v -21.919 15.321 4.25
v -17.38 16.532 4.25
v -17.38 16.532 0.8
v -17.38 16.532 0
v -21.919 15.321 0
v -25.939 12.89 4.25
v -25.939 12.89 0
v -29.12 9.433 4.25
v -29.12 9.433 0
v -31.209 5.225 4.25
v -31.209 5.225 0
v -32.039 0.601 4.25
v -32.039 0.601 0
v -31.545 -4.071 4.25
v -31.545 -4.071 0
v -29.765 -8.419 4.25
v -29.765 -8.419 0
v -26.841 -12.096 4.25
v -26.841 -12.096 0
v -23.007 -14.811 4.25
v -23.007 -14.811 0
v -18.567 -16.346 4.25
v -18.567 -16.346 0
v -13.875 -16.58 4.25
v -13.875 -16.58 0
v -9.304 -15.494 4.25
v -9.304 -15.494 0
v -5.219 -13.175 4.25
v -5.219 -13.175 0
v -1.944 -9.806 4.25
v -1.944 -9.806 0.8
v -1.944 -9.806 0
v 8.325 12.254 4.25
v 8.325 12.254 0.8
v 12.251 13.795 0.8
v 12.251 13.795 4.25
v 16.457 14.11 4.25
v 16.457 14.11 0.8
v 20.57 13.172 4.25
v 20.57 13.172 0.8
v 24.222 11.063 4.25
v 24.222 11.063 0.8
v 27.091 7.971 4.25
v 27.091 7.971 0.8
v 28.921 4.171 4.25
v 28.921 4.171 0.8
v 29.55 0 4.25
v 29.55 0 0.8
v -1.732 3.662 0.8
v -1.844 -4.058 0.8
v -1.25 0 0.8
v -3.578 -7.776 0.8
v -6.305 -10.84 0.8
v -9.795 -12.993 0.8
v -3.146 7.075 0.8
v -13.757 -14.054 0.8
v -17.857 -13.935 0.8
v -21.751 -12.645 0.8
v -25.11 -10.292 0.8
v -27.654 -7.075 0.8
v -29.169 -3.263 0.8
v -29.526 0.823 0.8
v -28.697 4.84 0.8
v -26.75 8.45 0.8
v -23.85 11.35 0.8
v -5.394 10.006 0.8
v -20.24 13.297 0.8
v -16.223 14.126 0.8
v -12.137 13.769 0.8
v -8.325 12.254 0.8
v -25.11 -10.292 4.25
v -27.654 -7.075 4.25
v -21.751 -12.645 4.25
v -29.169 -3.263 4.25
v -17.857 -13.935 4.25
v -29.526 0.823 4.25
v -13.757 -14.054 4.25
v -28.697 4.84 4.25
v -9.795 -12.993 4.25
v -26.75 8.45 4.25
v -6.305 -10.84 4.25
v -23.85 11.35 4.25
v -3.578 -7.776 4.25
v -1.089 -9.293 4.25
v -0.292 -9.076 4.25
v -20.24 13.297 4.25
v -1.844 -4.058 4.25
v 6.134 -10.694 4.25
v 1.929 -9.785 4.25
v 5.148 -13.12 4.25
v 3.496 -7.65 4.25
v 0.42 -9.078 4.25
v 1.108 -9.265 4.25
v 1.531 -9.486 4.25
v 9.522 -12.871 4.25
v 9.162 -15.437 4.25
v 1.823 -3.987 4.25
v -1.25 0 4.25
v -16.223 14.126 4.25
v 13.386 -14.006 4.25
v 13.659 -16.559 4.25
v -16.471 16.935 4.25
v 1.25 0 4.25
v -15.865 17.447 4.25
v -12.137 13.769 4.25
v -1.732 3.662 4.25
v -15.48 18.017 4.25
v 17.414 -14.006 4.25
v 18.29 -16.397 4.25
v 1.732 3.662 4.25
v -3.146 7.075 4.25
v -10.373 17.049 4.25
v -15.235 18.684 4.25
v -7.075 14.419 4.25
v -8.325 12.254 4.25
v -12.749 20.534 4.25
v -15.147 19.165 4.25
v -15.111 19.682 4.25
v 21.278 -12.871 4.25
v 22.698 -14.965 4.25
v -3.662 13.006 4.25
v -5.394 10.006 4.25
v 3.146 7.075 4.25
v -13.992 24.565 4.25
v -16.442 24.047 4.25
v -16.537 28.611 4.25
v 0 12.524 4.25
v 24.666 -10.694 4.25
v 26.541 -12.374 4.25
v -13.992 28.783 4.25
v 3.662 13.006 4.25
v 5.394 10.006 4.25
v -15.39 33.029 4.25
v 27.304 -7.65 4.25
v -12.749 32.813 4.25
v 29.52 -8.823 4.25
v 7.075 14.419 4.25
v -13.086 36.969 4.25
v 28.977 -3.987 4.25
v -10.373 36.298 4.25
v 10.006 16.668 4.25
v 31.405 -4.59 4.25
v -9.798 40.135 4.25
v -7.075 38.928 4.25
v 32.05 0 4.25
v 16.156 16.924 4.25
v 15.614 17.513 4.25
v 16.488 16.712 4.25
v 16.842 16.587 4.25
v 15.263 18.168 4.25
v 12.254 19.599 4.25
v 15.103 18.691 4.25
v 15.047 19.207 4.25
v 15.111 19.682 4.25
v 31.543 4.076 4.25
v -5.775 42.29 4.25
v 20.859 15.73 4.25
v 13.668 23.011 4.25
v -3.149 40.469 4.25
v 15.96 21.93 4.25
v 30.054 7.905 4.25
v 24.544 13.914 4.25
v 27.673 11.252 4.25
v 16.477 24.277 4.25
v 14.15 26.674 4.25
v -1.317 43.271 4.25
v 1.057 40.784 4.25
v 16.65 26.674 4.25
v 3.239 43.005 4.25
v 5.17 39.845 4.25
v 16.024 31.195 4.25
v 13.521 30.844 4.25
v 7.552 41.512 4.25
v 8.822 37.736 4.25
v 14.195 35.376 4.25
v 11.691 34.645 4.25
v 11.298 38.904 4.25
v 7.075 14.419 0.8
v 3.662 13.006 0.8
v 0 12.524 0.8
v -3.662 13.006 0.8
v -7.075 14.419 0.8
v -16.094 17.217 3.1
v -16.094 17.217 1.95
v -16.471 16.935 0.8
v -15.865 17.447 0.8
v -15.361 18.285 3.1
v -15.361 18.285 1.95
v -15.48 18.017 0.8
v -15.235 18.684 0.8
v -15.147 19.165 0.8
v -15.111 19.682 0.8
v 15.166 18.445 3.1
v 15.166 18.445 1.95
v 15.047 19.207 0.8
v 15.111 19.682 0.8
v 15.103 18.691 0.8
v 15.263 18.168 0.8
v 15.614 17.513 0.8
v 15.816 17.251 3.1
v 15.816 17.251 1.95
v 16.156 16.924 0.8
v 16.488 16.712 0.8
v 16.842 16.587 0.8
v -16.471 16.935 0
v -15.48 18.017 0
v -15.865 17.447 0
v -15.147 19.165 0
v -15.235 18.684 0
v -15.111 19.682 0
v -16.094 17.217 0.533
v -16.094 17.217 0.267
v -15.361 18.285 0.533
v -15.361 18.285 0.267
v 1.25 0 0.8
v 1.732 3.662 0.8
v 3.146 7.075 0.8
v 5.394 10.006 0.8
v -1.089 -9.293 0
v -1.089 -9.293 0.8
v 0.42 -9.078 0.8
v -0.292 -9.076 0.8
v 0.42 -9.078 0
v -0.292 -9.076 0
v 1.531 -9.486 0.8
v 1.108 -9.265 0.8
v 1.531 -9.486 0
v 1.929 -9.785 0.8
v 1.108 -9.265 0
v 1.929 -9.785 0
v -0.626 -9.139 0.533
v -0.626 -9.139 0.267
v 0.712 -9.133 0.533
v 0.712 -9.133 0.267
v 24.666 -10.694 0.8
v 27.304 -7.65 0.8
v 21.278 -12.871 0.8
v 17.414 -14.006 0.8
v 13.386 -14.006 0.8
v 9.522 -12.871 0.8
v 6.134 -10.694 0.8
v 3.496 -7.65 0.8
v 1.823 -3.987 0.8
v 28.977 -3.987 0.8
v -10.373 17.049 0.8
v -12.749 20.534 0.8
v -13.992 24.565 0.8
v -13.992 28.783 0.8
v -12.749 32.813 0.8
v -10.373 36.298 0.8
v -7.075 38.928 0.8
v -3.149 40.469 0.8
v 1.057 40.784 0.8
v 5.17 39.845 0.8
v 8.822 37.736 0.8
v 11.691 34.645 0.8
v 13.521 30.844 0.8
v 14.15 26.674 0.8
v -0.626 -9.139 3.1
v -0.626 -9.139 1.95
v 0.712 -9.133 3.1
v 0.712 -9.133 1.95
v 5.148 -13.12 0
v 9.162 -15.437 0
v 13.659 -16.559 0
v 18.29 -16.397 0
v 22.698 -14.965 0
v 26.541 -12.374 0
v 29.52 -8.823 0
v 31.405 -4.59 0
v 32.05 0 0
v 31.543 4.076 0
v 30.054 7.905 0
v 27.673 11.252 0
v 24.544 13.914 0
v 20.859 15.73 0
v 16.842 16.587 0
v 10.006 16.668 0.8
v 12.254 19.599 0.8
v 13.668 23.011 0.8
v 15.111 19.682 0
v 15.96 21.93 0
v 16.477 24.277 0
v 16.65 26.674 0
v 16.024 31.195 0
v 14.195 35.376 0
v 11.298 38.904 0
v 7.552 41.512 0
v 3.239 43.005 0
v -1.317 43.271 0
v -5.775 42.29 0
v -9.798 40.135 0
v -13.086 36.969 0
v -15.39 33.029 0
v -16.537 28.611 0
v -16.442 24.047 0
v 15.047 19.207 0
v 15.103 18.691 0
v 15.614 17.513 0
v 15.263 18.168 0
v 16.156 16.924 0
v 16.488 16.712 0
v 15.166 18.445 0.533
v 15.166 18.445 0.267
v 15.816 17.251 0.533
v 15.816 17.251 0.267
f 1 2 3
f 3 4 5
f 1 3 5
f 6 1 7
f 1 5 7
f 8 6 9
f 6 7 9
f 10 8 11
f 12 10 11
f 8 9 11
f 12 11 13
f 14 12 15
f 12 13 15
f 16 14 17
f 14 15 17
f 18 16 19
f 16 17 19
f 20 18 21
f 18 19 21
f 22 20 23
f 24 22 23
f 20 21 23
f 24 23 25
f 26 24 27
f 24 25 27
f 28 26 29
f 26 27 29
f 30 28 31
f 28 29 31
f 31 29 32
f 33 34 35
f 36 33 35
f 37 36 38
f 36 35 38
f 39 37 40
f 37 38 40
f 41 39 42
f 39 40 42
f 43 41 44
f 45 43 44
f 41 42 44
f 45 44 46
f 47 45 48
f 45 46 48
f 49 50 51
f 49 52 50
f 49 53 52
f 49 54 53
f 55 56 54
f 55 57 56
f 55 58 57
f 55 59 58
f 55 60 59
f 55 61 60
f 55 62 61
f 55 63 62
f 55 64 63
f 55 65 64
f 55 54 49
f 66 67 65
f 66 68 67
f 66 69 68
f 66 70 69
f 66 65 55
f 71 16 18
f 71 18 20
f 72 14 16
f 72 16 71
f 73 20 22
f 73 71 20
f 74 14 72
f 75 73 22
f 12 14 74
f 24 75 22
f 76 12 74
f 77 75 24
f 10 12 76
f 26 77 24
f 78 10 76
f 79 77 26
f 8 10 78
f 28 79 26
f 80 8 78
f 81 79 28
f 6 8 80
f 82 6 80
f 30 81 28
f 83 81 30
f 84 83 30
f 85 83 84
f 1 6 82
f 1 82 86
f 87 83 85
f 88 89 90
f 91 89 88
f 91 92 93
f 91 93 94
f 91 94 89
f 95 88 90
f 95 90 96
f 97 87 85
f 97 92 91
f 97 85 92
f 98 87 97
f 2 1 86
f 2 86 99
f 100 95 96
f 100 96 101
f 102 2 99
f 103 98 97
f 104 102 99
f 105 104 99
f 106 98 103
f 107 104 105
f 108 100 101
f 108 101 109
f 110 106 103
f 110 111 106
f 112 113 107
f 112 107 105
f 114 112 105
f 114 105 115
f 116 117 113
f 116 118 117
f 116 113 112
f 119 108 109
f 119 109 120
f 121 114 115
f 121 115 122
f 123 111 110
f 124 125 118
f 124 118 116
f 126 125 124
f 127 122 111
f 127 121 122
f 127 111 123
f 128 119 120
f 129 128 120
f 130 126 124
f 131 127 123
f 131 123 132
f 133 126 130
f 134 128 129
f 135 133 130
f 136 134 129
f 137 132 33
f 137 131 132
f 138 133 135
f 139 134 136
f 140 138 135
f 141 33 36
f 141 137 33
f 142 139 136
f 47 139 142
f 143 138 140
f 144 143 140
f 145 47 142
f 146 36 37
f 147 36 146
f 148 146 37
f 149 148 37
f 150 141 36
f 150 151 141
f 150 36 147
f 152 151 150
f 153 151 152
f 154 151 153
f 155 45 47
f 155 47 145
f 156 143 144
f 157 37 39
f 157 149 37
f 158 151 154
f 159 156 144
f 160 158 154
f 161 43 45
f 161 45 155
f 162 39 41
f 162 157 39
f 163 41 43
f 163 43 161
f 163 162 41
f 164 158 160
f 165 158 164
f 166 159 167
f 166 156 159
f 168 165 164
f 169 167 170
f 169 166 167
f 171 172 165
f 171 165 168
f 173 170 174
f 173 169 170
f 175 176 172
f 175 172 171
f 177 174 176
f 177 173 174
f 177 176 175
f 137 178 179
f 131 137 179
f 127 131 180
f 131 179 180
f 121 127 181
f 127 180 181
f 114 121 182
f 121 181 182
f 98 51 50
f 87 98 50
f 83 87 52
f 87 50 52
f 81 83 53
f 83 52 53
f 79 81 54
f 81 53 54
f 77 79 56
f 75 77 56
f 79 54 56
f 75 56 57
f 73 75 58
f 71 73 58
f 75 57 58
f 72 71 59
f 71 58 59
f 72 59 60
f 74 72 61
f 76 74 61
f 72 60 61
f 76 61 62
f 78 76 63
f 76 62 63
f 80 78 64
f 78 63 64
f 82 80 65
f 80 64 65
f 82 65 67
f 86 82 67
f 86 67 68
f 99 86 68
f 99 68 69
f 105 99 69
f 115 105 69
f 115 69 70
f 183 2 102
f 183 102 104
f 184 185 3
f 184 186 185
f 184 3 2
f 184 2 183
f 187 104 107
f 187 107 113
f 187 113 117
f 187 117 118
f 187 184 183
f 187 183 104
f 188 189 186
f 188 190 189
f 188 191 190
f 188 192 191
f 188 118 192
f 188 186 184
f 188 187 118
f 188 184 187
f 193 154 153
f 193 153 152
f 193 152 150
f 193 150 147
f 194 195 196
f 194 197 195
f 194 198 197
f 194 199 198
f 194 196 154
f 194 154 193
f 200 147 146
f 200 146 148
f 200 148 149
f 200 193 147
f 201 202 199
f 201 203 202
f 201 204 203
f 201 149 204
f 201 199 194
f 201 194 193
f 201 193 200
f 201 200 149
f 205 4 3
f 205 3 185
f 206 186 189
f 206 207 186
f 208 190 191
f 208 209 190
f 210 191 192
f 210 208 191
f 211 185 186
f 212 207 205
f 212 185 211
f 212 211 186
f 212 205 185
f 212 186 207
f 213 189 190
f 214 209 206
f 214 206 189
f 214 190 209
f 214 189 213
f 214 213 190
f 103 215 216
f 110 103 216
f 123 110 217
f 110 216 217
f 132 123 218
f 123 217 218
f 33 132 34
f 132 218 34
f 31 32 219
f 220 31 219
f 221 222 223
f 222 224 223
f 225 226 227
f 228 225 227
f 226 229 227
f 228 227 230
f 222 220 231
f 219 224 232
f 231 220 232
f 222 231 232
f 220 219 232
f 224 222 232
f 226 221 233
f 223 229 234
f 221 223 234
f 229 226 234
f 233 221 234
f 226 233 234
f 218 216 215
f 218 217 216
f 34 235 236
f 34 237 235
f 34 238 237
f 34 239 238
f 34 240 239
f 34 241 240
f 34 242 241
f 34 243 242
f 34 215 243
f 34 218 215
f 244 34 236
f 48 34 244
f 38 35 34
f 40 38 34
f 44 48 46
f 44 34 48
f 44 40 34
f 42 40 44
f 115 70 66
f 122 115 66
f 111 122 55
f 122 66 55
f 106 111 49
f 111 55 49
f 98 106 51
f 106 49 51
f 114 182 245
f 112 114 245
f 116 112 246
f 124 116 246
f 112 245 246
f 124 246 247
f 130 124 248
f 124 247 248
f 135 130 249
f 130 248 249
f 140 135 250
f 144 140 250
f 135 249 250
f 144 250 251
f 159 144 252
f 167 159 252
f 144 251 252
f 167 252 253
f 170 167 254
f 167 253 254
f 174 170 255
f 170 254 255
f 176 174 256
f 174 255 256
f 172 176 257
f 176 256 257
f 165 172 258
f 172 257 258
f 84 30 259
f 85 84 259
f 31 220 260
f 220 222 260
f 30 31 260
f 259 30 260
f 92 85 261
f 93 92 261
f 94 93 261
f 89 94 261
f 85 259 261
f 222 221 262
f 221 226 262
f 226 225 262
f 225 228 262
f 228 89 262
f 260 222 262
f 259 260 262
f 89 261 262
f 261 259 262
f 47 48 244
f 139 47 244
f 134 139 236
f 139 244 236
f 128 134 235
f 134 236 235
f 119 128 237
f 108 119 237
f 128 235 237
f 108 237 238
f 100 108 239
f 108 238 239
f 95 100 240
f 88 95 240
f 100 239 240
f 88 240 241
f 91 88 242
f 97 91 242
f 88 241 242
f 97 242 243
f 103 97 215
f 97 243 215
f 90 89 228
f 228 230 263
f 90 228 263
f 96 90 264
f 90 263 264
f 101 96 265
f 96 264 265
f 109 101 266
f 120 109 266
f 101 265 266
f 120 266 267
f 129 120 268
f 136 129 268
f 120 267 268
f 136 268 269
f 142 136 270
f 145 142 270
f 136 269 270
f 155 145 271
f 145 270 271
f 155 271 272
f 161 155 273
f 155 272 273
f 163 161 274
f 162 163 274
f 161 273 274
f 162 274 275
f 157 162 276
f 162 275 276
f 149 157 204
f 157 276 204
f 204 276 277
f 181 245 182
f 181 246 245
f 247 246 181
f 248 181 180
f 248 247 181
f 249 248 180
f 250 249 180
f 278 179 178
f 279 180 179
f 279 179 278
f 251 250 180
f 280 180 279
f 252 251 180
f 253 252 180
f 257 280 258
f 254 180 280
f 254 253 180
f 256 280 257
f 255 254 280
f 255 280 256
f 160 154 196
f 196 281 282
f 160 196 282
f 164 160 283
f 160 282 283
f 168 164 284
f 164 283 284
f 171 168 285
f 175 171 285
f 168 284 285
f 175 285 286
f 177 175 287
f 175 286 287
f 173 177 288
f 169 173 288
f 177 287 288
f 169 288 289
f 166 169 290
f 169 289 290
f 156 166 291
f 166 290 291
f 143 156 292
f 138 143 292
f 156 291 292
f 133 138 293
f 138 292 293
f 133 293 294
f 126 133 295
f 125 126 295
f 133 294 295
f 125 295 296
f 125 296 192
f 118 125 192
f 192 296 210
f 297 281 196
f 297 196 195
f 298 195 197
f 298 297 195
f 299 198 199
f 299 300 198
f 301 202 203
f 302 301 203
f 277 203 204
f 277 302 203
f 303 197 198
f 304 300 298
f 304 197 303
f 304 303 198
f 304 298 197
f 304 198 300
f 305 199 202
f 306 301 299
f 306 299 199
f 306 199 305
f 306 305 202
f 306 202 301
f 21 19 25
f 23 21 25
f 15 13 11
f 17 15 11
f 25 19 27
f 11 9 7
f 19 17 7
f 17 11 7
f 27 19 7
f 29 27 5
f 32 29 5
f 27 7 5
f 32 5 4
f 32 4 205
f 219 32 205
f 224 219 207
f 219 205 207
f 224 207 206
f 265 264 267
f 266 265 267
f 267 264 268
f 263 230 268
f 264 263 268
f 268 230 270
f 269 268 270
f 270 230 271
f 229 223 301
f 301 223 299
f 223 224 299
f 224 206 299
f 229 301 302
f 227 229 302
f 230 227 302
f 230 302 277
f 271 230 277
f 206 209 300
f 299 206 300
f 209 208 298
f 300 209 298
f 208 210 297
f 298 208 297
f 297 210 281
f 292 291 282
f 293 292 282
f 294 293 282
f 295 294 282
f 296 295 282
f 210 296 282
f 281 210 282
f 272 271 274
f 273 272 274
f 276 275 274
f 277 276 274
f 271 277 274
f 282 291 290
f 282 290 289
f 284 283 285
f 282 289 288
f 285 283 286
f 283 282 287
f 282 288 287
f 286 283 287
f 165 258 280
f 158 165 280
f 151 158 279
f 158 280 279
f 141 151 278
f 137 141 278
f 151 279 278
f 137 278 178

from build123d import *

# Parameters (mm, degrees)
F1_DEPTH = 0.8
F2_DEPTH = 4.25


with BuildPart() as f1:
    # F0 (on Top) → F1 (new body)
    with BuildSketch(Plane.XY):
        with BuildLine():
            ThreePointArc((-1.9441843304, -9.8063002537), (-0.8677403981, -8.1262494955), (0, -6.3294944506))
            ThreePointArc((0, -6.3294944506), (-0.934511012, -3.2258719751), (-1.25, 0))
            ThreePointArc((-1.25, 0), (-27.654259501, -7.0749999351), (-8.3249998702, 12.2542593886))
            ThreePointArc((-8.3249998702, 12.2542593886), (-10.9609425294, 14.14041688), (-13.1815029873, 16.5015384436))
            ThreePointArc((-13.1815029873, 16.5015384436), (-15.2798080373, 16.6495661773), (-17.3800314921, 16.5318473042))
            ThreePointArc((-17.3800314921, 16.5318473042), (-29.7648149942, -8.4187047805), (-1.9441843304, -9.8063002537))
        make_face()
        with BuildLine():
            ThreePointArc((29.55, 0), (15.4, -14.15), (1.25, 0))
            ThreePointArc((1.25, 0), (0.934511012, -3.2258719751), (0, -6.3294944506))
            ThreePointArc((0, -6.3294944506), (0.8614331824, -8.1149599439), (1.9289676052, -9.7853863601))
            ThreePointArc((1.9289676052, -9.7853863601), (20.5444052438, -15.835327426), (32.05, 0))
            ThreePointArc((32.05, 0), (27.6726376204, 11.2518827686), (16.8422083078, 16.5874209929))
            ThreePointArc((16.8422083078, 16.5874209929), (15.0094875272, 16.6454197907), (13.1815029873, 16.5015384436))
            ThreePointArc((13.1815029873, 16.5015384436), (10.9609426486, 14.1404169843), (8.3250001445, 12.2542595469))
            ThreePointArc((8.3250001445, 12.2542595469), (22.4750000722, 12.2542594219), (29.55, 0))
        make_face()
        with BuildLine():
            ThreePointArc((7.075000026, 14.419322988), (10.026431588, 15.7590374872), (13.1815029873, 16.5015384436))
            ThreePointArc((13.1815029873, 16.5015384436), (14.2351793304, 18.0374855502), (15.1107061135, 19.681511159))
            ThreePointArc((15.1107061135, 19.681511159), (16.2606235549, 23.0938308244), (16.65, 26.6735824366))
            ThreePointArc((16.65, 26.6735824366), (-3.5797516122, 42.9342059915), (-15.1107061135, 19.681511159))
            ThreePointArc((-15.1107061135, 19.681511159), (-14.2351793304, 18.0374855502), (-13.1815029873, 16.5015384436))
            ThreePointArc((-13.1815029873, 16.5015384436), (-10.0264316681, 15.7590375145), (-7.0750001725, 14.4193230726))
            ThreePointArc((-7.0750001725, 14.4193230726), (-7.0749999137, 38.9278419499), (14.15, 26.6735824366))
            ThreePointArc((14.15, 26.6735824366), (12.254259471, 19.5985824495), (7.075000026, 14.419322988))
        make_face()
        with BuildLine():
            ThreePointArc((8.3250001445, 12.2542595469), (3.1457405781, 7.0750000722), (1.25, 0))
            ThreePointArc((1.25, 0), (15.4, -14.15), (29.55, 0))
            ThreePointArc((29.55, 0), (22.4750000722, 12.2542594219), (8.3250001445, 12.2542595469))
        make_face()
        with BuildLine():
            ThreePointArc((-7.0750001725, 14.4193230726), (-8.46e-08, 12.5235824366), (7.075000026, 14.419322988))
            ThreePointArc((7.075000026, 14.419322988), (12.254259471, 19.5985824495), (14.15, 26.6735824366))
            ThreePointArc((14.15, 26.6735824366), (-7.0749999137, 38.9278419499), (-7.0750001725, 14.4193230726))
        make_face()
        with BuildLine():
            ThreePointArc((-8.3249998702, 12.2542593886), (-27.654259501, -7.0749999351), (-1.25, 0))
            ThreePointArc((-1.25, 0), (-3.145740499, 7.0749999351), (-8.3249998702, 12.2542593886))
        make_face()
        with BuildLine():
            ThreePointArc((15.1107061135, 19.681511159), (14.2351793304, 18.0374855502), (13.1815029873, 16.5015384436))
            ThreePointArc((13.1815029873, 16.5015384436), (15.0094875272, 16.6454197907), (16.8422083078, 16.5874209929))
            add(Edge.make_bspline(
                [(15.1107061135, 19.681511159), (14.7949214968, 18.5853722938), (15.7018187627, 16.8237693996), (16.8422083078, 16.5874209929)],
                knots=[0, 0, 0, 0, 3.5456302408, 3.5456302408, 3.5456302408, 3.5456302408], degree=3))
        make_face()
        with BuildLine():
            ThreePointArc((1.9289676052, -9.7853863601), (0.8614331824, -8.1149599439), (0, -6.3294944506))
            ThreePointArc((0, -6.3294944506), (-0.8677403981, -8.1262494955), (-1.9441843304, -9.8063002537))
            add(Edge.make_bspline(
                [(-1.9441843304, -9.8063002537), (-0.6821660037, -8.8059748815), (0.8183994243, -8.8064145129), (1.9289676052, -9.7853863601)],
                knots=[0, 0, 0, 0, 3.8732083996, 3.8732083996, 3.8732083996, 3.8732083996], degree=3))
        make_face()
        with BuildLine():
            add(Edge.make_bspline(
                [(-17.3800314921, 16.5318473042), (-15.7951249097, 17.0070298051), (-15.1426289174, 18.1383281448), (-15.1107061135, 19.681511159)],
                knots=[0, 0, 0, 0, 3.8820381337, 3.8820381337, 3.8820381337, 3.8820381337], degree=3))
            ThreePointArc((-17.3800314921, 16.5318473042), (-15.2798080373, 16.6495661773), (-13.1815029873, 16.5015384436))
            ThreePointArc((-13.1815029873, 16.5015384436), (-14.2351793304, 18.0374855502), (-15.1107061135, 19.681511159))
        make_face()
        with BuildLine():
            ThreePointArc((-2.2184970127, 10.172043993), (-0.980677027, 8.325), (0, 6.3294944506))
            ThreePointArc((0, 6.3294944506), (0.980677027, 8.325), (2.2184970127, 10.172043993))
            ThreePointArc((2.2184970127, 10.172043993), (0, 10.0235824366), (-2.2184970127, 10.172043993))
        make_face()
        with BuildLine():
            ThreePointArc((0, 6.3294944506), (0.934511012, 3.2258719751), (1.25, 0))
            ThreePointArc((1.25, 0), (3.1457405781, 7.0750000722), (8.3250001445, 12.2542595469))
            ThreePointArc((8.3250001445, 12.2542595469), (5.3735685051, 10.9145449811), (2.2184970127, 10.172043993))
            ThreePointArc((2.2184970127, 10.172043993), (0.980677027, 8.325), (0, 6.3294944506))
        make_face()
        with BuildLine():
            ThreePointArc((-2.2184970127, 10.172043993), (0, 10.0235824366), (2.2184970127, 10.172043993))
            ThreePointArc((2.2184970127, 10.172043993), (4.4390574255, 12.5331655171), (7.075000026, 14.419322988))
            ThreePointArc((7.075000026, 14.419322988), (-8.46e-08, 12.5235824366), (-7.0750001725, 14.4193230726))
            ThreePointArc((-7.0750001725, 14.4193230726), (-4.4390574892, 12.5331655728), (-2.2184970127, 10.172043993))
        make_face()
        with BuildLine():
            ThreePointArc((-1.25, 0), (-0.934511012, 3.2258719751), (0, 6.3294944506))
            ThreePointArc((0, 6.3294944506), (-0.980677027, 8.325), (-2.2184970127, 10.172043993))
            ThreePointArc((-2.2184970127, 10.172043993), (-5.3735683552, 10.91454493), (-8.3249998702, 12.2542593886))
            ThreePointArc((-8.3249998702, 12.2542593886), (-3.145740499, 7.0749999351), (-1.25, 0))
        make_face()
        with BuildLine():
            ThreePointArc((2.2184970127, 10.172043993), (5.3735685051, 10.9145449811), (8.3250001445, 12.2542595469))
            ThreePointArc((8.3250001445, 12.2542595469), (10.9609426486, 14.1404169843), (13.1815029873, 16.5015384436))
            ThreePointArc((13.1815029873, 16.5015384436), (10.026431588, 15.7590374872), (7.075000026, 14.419322988))
            ThreePointArc((7.075000026, 14.419322988), (4.4390574255, 12.5331655171), (2.2184970127, 10.172043993))
        make_face()
        with BuildLine():
            ThreePointArc((0, -6.3294944506), (0.934511012, -3.2258719751), (1.25, 0))
            ThreePointArc((1.25, 0), (0.934511012, 3.2258719751), (0, 6.3294944506))
            ThreePointArc((0, 6.3294944506), (-0.934511012, 3.2258719751), (-1.25, 0))
            ThreePointArc((-1.25, 0), (-0.934511012, -3.2258719751), (0, -6.3294944506))
        make_face()
        with BuildLine():
            ThreePointArc((-8.3249998702, 12.2542593886), (-5.3735683552, 10.91454493), (-2.2184970127, 10.172043993))
            ThreePointArc((-2.2184970127, 10.172043993), (-4.4390574892, 12.5331655728), (-7.0750001725, 14.4193230726))
            ThreePointArc((-7.0750001725, 14.4193230726), (-10.0264316681, 15.7590375145), (-13.1815029873, 16.5015384436))
            ThreePointArc((-13.1815029873, 16.5015384436), (-10.9609425294, 14.14041688), (-8.3249998702, 12.2542593886))
        make_face()
    extrude(amount=F1_DEPTH)

    # F0 (on Top) → F2 (join)
    with BuildSketch(Plane.XY):
        with BuildLine():
            ThreePointArc((29.55, 0), (15.4, -14.15), (1.25, 0))
            ThreePointArc((1.25, 0), (0.934511012, -3.2258719751), (0, -6.3294944506))
            ThreePointArc((0, -6.3294944506), (0.8614331824, -8.1149599439), (1.9289676052, -9.7853863601))
            ThreePointArc((1.9289676052, -9.7853863601), (20.5444052438, -15.835327426), (32.05, 0))
            ThreePointArc((32.05, 0), (27.6726376204, 11.2518827686), (16.8422083078, 16.5874209929))
            ThreePointArc((16.8422083078, 16.5874209929), (15.0094875272, 16.6454197907), (13.1815029873, 16.5015384436))
            ThreePointArc((13.1815029873, 16.5015384436), (10.9609426486, 14.1404169843), (8.3250001445, 12.2542595469))
            ThreePointArc((8.3250001445, 12.2542595469), (22.4750000722, 12.2542594219), (29.55, 0))
        make_face()
        with BuildLine():
            ThreePointArc((-1.9441843304, -9.8063002537), (-0.8677403981, -8.1262494955), (0, -6.3294944506))
            ThreePointArc((0, -6.3294944506), (-0.934511012, -3.2258719751), (-1.25, 0))
            ThreePointArc((-1.25, 0), (-27.654259501, -7.0749999351), (-8.3249998702, 12.2542593886))
            ThreePointArc((-8.3249998702, 12.2542593886), (-10.9609425294, 14.14041688), (-13.1815029873, 16.5015384436))
            ThreePointArc((-13.1815029873, 16.5015384436), (-15.2798080373, 16.6495661773), (-17.3800314921, 16.5318473042))
            ThreePointArc((-17.3800314921, 16.5318473042), (-29.7648149942, -8.4187047805), (-1.9441843304, -9.8063002537))
        make_face()
        with BuildLine():
            ThreePointArc((1.9289676052, -9.7853863601), (0.8614331824, -8.1149599439), (0, -6.3294944506))
            ThreePointArc((0, -6.3294944506), (-0.8677403981, -8.1262494955), (-1.9441843304, -9.8063002537))
            add(Edge.make_bspline(
                [(-1.9441843304, -9.8063002537), (-0.6821660037, -8.8059748815), (0.8183994243, -8.8064145129), (1.9289676052, -9.7853863601)],
                knots=[0, 0, 0, 0, 3.8732083996, 3.8732083996, 3.8732083996, 3.8732083996], degree=3))
        make_face()
        with BuildLine():
            ThreePointArc((15.1107061135, 19.681511159), (14.2351793304, 18.0374855502), (13.1815029873, 16.5015384436))
            ThreePointArc((13.1815029873, 16.5015384436), (15.0094875272, 16.6454197907), (16.8422083078, 16.5874209929))
            add(Edge.make_bspline(
                [(15.1107061135, 19.681511159), (14.7949214968, 18.5853722938), (15.7018187627, 16.8237693996), (16.8422083078, 16.5874209929)],
                knots=[0, 0, 0, 0, 3.5456302408, 3.5456302408, 3.5456302408, 3.5456302408], degree=3))
        make_face()
        with BuildLine():
            ThreePointArc((7.075000026, 14.419322988), (10.026431588, 15.7590374872), (13.1815029873, 16.5015384436))
            ThreePointArc((13.1815029873, 16.5015384436), (14.2351793304, 18.0374855502), (15.1107061135, 19.681511159))
            ThreePointArc((15.1107061135, 19.681511159), (16.2606235549, 23.0938308244), (16.65, 26.6735824366))
            ThreePointArc((16.65, 26.6735824366), (-3.5797516122, 42.9342059915), (-15.1107061135, 19.681511159))
            ThreePointArc((-15.1107061135, 19.681511159), (-14.2351793304, 18.0374855502), (-13.1815029873, 16.5015384436))
            ThreePointArc((-13.1815029873, 16.5015384436), (-10.0264316681, 15.7590375145), (-7.0750001725, 14.4193230726))
            ThreePointArc((-7.0750001725, 14.4193230726), (-7.0749999137, 38.9278419499), (14.15, 26.6735824366))
            ThreePointArc((14.15, 26.6735824366), (12.254259471, 19.5985824495), (7.075000026, 14.419322988))
        make_face()
        with BuildLine():
            add(Edge.make_bspline(
                [(-17.3800314921, 16.5318473042), (-15.7951249097, 17.0070298051), (-15.1426289174, 18.1383281448), (-15.1107061135, 19.681511159)],
                knots=[0, 0, 0, 0, 3.8820381337, 3.8820381337, 3.8820381337, 3.8820381337], degree=3))
            ThreePointArc((-17.3800314921, 16.5318473042), (-15.2798080373, 16.6495661773), (-13.1815029873, 16.5015384436))
            ThreePointArc((-13.1815029873, 16.5015384436), (-14.2351793304, 18.0374855502), (-15.1107061135, 19.681511159))
        make_face()
        with BuildLine():
            ThreePointArc((-8.3249998702, 12.2542593886), (-5.3735683552, 10.91454493), (-2.2184970127, 10.172043993))
            ThreePointArc((-2.2184970127, 10.172043993), (-4.4390574892, 12.5331655728), (-7.0750001725, 14.4193230726))
            ThreePointArc((-7.0750001725, 14.4193230726), (-10.0264316681, 15.7590375145), (-13.1815029873, 16.5015384436))
            ThreePointArc((-13.1815029873, 16.5015384436), (-10.9609425294, 14.14041688), (-8.3249998702, 12.2542593886))
        make_face()
        with BuildLine():
            ThreePointArc((-1.25, 0), (-0.934511012, 3.2258719751), (0, 6.3294944506))
            ThreePointArc((0, 6.3294944506), (-0.980677027, 8.325), (-2.2184970127, 10.172043993))
            ThreePointArc((-2.2184970127, 10.172043993), (-5.3735683552, 10.91454493), (-8.3249998702, 12.2542593886))
            ThreePointArc((-8.3249998702, 12.2542593886), (-3.145740499, 7.0749999351), (-1.25, 0))
        make_face()
        with BuildLine():
            ThreePointArc((-2.2184970127, 10.172043993), (0, 10.0235824366), (2.2184970127, 10.172043993))
            ThreePointArc((2.2184970127, 10.172043993), (4.4390574255, 12.5331655171), (7.075000026, 14.419322988))
            ThreePointArc((7.075000026, 14.419322988), (-8.46e-08, 12.5235824366), (-7.0750001725, 14.4193230726))
            ThreePointArc((-7.0750001725, 14.4193230726), (-4.4390574892, 12.5331655728), (-2.2184970127, 10.172043993))
        make_face()
        with BuildLine():
            ThreePointArc((2.2184970127, 10.172043993), (5.3735685051, 10.9145449811), (8.3250001445, 12.2542595469))
            ThreePointArc((8.3250001445, 12.2542595469), (10.9609426486, 14.1404169843), (13.1815029873, 16.5015384436))
            ThreePointArc((13.1815029873, 16.5015384436), (10.026431588, 15.7590374872), (7.075000026, 14.419322988))
            ThreePointArc((7.075000026, 14.419322988), (4.4390574255, 12.5331655171), (2.2184970127, 10.172043993))
        make_face()
        with BuildLine():
            ThreePointArc((0, 6.3294944506), (0.934511012, 3.2258719751), (1.25, 0))
            ThreePointArc((1.25, 0), (3.1457405781, 7.0750000722), (8.3250001445, 12.2542595469))
            ThreePointArc((8.3250001445, 12.2542595469), (5.3735685051, 10.9145449811), (2.2184970127, 10.172043993))
            ThreePointArc((2.2184970127, 10.172043993), (0.980677027, 8.325), (0, 6.3294944506))
        make_face()
        with BuildLine():
            ThreePointArc((0, -6.3294944506), (0.934511012, -3.2258719751), (1.25, 0))
            ThreePointArc((1.25, 0), (0.934511012, 3.2258719751), (0, 6.3294944506))
            ThreePointArc((0, 6.3294944506), (-0.934511012, 3.2258719751), (-1.25, 0))
            ThreePointArc((-1.25, 0), (-0.934511012, -3.2258719751), (0, -6.3294944506))
        make_face()
        with BuildLine():
            ThreePointArc((-2.2184970127, 10.172043993), (-0.980677027, 8.325), (0, 6.3294944506))
            ThreePointArc((0, 6.3294944506), (0.980677027, 8.325), (2.2184970127, 10.172043993))
            ThreePointArc((2.2184970127, 10.172043993), (0, 10.0235824366), (-2.2184970127, 10.172043993))
        make_face()
    extrude(amount=F2_DEPTH)


solid = f1.part
